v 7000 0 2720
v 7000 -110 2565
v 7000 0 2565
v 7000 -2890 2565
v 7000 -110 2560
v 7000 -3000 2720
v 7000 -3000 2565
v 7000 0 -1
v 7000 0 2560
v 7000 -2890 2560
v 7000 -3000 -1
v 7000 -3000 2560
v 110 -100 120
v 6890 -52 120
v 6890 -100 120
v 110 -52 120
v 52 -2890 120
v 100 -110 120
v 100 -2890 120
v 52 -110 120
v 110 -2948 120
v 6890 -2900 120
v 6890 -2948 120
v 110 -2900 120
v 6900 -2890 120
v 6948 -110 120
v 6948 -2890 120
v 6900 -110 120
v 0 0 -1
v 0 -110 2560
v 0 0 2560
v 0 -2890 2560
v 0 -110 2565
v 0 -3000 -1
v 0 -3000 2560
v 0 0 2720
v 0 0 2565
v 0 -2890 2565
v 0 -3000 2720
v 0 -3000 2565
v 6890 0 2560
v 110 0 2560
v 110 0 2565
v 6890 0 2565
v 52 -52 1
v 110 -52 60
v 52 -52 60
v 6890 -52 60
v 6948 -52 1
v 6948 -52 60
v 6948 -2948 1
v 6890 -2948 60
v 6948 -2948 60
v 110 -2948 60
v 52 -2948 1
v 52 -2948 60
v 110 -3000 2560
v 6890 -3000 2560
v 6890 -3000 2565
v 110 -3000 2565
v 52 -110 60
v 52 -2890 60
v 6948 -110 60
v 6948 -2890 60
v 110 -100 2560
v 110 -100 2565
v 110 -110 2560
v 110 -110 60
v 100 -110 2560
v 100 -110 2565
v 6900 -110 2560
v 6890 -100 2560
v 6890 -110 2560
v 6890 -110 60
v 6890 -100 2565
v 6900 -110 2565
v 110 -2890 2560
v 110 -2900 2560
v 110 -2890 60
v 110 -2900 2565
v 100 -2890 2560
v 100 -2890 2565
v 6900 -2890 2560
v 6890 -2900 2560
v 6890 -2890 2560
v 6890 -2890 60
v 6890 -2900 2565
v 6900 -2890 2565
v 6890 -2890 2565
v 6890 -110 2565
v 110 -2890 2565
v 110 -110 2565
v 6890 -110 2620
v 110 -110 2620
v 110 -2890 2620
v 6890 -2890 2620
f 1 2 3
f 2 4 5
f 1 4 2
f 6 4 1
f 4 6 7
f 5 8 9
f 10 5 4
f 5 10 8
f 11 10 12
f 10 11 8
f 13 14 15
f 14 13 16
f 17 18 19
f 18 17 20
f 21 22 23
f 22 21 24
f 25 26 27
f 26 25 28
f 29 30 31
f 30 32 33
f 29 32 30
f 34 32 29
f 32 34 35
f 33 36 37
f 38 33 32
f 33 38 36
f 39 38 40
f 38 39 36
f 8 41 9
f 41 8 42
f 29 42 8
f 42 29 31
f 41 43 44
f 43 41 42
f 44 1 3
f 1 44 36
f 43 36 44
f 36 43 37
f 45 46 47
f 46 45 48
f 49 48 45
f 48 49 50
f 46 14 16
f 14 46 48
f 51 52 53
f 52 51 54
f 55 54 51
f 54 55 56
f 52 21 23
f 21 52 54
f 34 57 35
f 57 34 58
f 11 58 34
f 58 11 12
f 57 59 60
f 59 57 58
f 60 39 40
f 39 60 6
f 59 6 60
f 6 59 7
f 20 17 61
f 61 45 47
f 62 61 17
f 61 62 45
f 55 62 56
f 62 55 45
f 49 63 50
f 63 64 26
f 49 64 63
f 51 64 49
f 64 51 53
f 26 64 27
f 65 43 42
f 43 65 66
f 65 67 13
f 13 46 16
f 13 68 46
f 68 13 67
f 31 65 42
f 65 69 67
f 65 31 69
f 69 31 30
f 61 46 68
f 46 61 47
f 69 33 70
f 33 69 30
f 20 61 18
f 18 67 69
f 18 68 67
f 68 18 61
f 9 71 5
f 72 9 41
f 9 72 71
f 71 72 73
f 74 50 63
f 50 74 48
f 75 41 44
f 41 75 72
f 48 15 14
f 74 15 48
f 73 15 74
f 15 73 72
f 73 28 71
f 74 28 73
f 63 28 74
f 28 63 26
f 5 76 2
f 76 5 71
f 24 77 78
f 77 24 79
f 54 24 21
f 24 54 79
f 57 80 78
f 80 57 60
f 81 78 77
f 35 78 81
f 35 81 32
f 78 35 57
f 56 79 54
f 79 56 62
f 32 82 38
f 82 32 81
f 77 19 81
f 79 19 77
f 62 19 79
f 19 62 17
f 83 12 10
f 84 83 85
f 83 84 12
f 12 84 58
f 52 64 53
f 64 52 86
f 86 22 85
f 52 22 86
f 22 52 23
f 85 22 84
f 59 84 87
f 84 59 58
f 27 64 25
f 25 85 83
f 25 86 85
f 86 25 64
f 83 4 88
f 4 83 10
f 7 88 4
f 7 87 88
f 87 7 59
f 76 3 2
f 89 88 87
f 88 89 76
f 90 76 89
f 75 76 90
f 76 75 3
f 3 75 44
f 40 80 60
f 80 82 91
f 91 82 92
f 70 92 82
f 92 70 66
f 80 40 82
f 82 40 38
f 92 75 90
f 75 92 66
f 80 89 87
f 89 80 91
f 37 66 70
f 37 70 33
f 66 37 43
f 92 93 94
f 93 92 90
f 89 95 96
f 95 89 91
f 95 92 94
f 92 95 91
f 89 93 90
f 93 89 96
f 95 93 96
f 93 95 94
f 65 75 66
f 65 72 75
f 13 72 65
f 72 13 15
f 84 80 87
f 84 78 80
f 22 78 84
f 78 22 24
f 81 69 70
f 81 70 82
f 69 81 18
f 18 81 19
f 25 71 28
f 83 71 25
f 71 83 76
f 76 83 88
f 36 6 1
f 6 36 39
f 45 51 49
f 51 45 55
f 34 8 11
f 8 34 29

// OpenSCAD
// ============================================================================
// CONTAINER DESIGN MODULE - IMPROVED VERSION
// ============================================================================
// Description: Parametric container design system with steel profiles
// Author: Improved version
// Date: 2025-10-26
// ============================================================================

// ============================================================================
// CONFIGURATION PARAMETERS
// ============================================================================

/* [Main Container Dimensions] */
container_length = 7000;  // [3000:100:9020] Length of container (mm)
container_width = 3000;   // [2000:100:3000] Width of container (mm)
container_height = 2500;  // [1800:10:3000] Height of container (mm)

/* [Container Specification] */
container_type = "ПБК";              // ["ПБК", "УБК"] Container type
sandwich_thickness = 100;             // [50:10:150] Sandwich panel thickness (mm)
temperature_mode = -60;               // [-60:10:40] Minimum temperature (°C)

/* [Base Frame Parameters] */
sheet_width = 1250;                   // Width of sheet metal in base frame
main_beam_type = "12П";               // ["10П", "12П", "14П", "16П"] Main transverse beam type
long_beam_material = "Труба";         // ["Труба", "Швеллер"] Longitudinal beam material
long_beam_step = 1200;                // [400:100:2000] Longitudinal beam spacing (mm)

/* [Additional Elements] */
show_drainage = true;                 // Show drainage trough
show_corner_brackets = true;          // Show corner brackets
corner_bracket_size = 140;            // [100:10:200] Corner bracket size (mm)

/* [Door Parameters] */
door_height = 2000;                   // [1800:100:2400] Door height (mm)
door_width = 1007;                    // [800:100:1200] Door width (mm)

/* [Cable Entry Parameters] */
cable_entry_height = 300;             // [200:50:500] Cable entry height (mm)
cable_entry_offset = 500;             // [300:100:1000] Cable entry offset (mm)
cable_entry_count = 5;                // [1:1:10] Number of cable entries
cable_entry_profile = "50x50x3";      // Profile type for cable entry

/* [Filling Neck Parameters] */
filling_neck_height = 1500;           // [1000:100:2000] Filling neck height (mm)
filling_neck_offset = 500;            // [300:100:1000] Filling neck offset (mm)

/* [Roof Parameters] */
roof_rafter_profile = "40x20x2";      // Rafter profile type
roof_ridge_height = 100;              // [0:50:200] Roof ridge height (mm)

/* [Ventilation Grilles] */
grille_anr1_height = 1000;            // [500:100:1500] ANR1 grille height (mm)
grille_anr1_width = 1000;             // [500:100:1500] ANR1 grille width (mm)
grille_anr2_height = 1000;            // [500:100:1500] ANR2 grille height (mm)
grille_anr2_width = 1000;             // [500:100:1500] ANR2 grille width (mm)

/* [Visualization] */
transparency = 0.5;                   // [0:0.1:1] Component transparency
element_config = 1;                   // [1:1:10] Element arrangement configuration

/* [System Parameters] */
$fn = 50;                             // Circle resolution
visual_scale = 1.0;                   // [0.5:0.1:2.0] Visual scale factor
standard_panel_width = 1195;          // Standard sandwich panel width (mm)

// ============================================================================
// MATERIAL DATABASE - STEEL PROFILES
// ============================================================================
// Format: [Name, Standard, Size, Subtype, h, b, s, t, r, R, A, Mass]

function create_profile_database() = [
    // Channels (Швеллер)
    ["Швеллер", "ГОСТ 8240-97", "12Л", "легкой серии с параллельными гранями полок", 120, 30, 3, 4.8, 7.6, 7, 6.39, 5.02],
    ["Швеллер", "ГОСТ 8240-97", "16Л", "легкой серии с параллельными гранями полок", 160, 35, 3.4, 5.3, 8.3, 8, 9.04, 7.1],
    ["Швеллер", "ГОСТ 8240-89", "10П", "с параллельными гранями полок", 100, 46, 4.5, 7.6, 15.3, 7, 10.9, 8.59],
    ["Швеллер", "ГОСТ 8240-89", "12П", "с параллельными гранями полок", 120, 52, 4.8, 7.8, 16.6, 7.5, 13.3, 10.4],
    ["Швеллер", "ГОСТ 8240-89", "14П", "с параллельными гранями полок", 140, 58, 4.9, 8.1, 18.2, 8, 15.6, 12.3],
    ["Швеллер", "ГОСТ 8240-89", "16П", "с параллельными гранями полок", 160, 64, 5, 8.4, 19.7, 8.5, 18.1, 14.2],

    // Square Tubes (Труба квадратная)
    ["Труба", "ГОСТ Р 54157-2010", "40x40x3", "квадратная", 40, 40, 3, 6, 4.21, 3.3, 9.32, 4.66],
    ["Труба", "ГОСТ Р 54157-2010", "50x50x3", "квадратная", 50, 50, 3, 6, 5.41, 4.25, 19.47, 7.79],
    ["Труба", "ГОСТ 30245-2003", "80x80x6", "квадратная", 80, 80, 6, 12, 9.38, 7.36, 56.97, 9.8],
    ["Труба", "ГОСТ 30245-2003", "100x100x5", "квадратная", 100, 100, 5, 10, 18.36, 14.41, 270.9, 54.19],
    ["Труба", "ГОСТ 30245-2003", "120x120x5", "квадратная", 120, 120, 6, 12, 26.43, 20.75, 561.8, 93.64],
    ["Труба", "ГОСТ 30245-2003", "140x140x7", "квадратная", 140, 140, 7, 17.5, 35.56, 27.91, 1020, 145.7],
    ["Труба", "ГОСТ 30245-2003", "160x160x6", "квадратная", 160, 160, 6, 12, 36.03, 28.29, 1405, 175.6],

    // Rectangular Tubes (Труба прямоугольная)
    ["Труба", "ГОСТ Р 54157-2010", "40x20x2", "прямоугольная", 40, 20, 2, 3, 2.17, 1.704, 4.18, 2.09],
    ["Труба", "ГОСТ 30245-2003", "80x40x3", "прямоугольная", 80, 40, 3, 6, 6.61, 5.19, 52.24, 13.06],
    ["Труба", "ГОСТ Р 54157-2010", "80x40x3", "прямоугольная", 80, 40, 3, 6, 6.61, 5.195, 52.25, 13.06],
    ["Труба", "ГОСТ 30245-2003", "150x100x5", "прямоугольная", 150, 100, 5, 10, 23.36, 18.33, 719, 95.87],
    ["Труба", "ГОСТ Р 54157-2010", "150x100x5", "прямоугольная", 150, 100, 5, 10, 23.36, 18.33, 719.2, 95.89],

    // Angles (Уголок)
    ["Уголок", "ГОСТ 8509-93", "50x50x5", "равнополочный", 50, 50, 5, 5.5, 4.8, 3.77, 11.2, 3.13],
    ["Уголок", "ГОСТ 8509-93", "63x63x6", "равнополочный", 63, 63, 6, 7, 7.28, 5.72, 27.06, 5.98],
    ["Уголок", "ГОСТ 8509-93", "80x80x6", "равнополочный", 80, 80, 6, 9, 9.38, 7.36, 56.97, 9.8],
    ["Уголок", "ГОСТ 8509-93", "90x90x6", "равнополочный", 90, 90, 6, 10, 10.61, 8.33, 82.1, 12.49],
    ["Уголок", "ГОСТ 8509-93", "110x110x7", "равнополочный", 110, 110, 7, 12, 15.15, 11.89, 175.61, 21.83],

    // Strips (Полоса)
    ["Полоса", "ГОСТ 103-76", "4x40", "горячекатанная", 40, 4, undef, undef, undef, undef, undef, undef]
];

// ============================================================================
// HELPER FUNCTIONS - DATABASE ACCESS
// ============================================================================

// Get parameter from profile database
function get_profile_param(material, size, param, database = undef) =
    let(
        db = database == undef ? create_profile_database() : database,
        matched = [for (profile = db)
            if (profile[0] == material && profile[2] == size) profile
        ]
    )
    len(matched) > 0 ?
        let(profile = matched[0])
        param == "name" ? profile[0] :
        param == "standard" ? profile[1] :
        param == "size" ? profile[2] :
        param == "subtype" ? profile[3] :
        param == "h" ? profile[4] :
        param == "b" ? profile[5] :
        param == "s" ? profile[6] :
        param == "t" ? profile[7] :
        param == "r" ? profile[8] :
        param == "R" ? profile[9] :
        param == "A" ? profile[10] :
        param == "mass" ? profile[11] :
        undef
    : undef;

// Get beam type and size based on component, container type, and sandwich thickness
function get_beam_spec(component_name, container_type, sandwich_thick) =
    let(
        specs = [
            // Upper frame longitudinal beams
            ["Балка продольная левая верхней рамы", "ПБК", 50, "Уголок", "63x63x6"],
            ["Балка продольная левая верхней рамы", "ПБК", 80, "Уголок", "90x90x6"],
            ["Балка продольная левая верхней рамы", "ПБК", 100, "Уголок", "110x110x7"],
            ["Балка продольная левая верхней рамы", "УБК", 50, "Труба", "80x40x3"],
            ["Балка продольная левая верхней рамы", "УБК", 80, "Труба", "80x40x3"],
            ["Балка продольная левая верхней рамы", "УБК", 100, "Труба", "80x40x3"],

            ["Балка продольная правая верхней рамы", "ПБК", 50, "Уголок", "63x63x6"],
            ["Балка продольная правая верхней рамы", "ПБК", 80, "Уголок", "90x90x6"],
            ["Балка продольная правая верхней рамы", "ПБК", 100, "Уголок", "110x110x7"],
            ["Балка продольная правая верхней рамы", "УБК", 50, "Труба", "80x40x3"],
            ["Балка продольная правая верхней рамы", "УБК", 80, "Труба", "80x40x3"],
            ["Балка продольная правая верхней рамы", "УБК", 100, "Труба", "80x40x3"],

            // Upper frame transverse beams
            ["Балка поперечная передняя верхней рамы", "ПБК", 50, "Уголок", "63x63x6"],
            ["Балка поперечная передняя верхней рамы", "ПБК", 80, "Уголок", "90x90x6"],
            ["Балка поперечная передняя верхней рамы", "ПБК", 100, "Уголок", "110x110x7"],
            ["Балка поперечная передняя верхней рамы", "УБК", 50, "Труба", "80x40x3"],
            ["Балка поперечная передняя верхней рамы", "УБК", 80, "Труба", "80x40x3"],
            ["Балка поперечная передняя верхней рамы", "УБК", 100, "Труба", "80x40x3"],

            ["Балка поперечная задняя верхней рамы", "ПБК", 50, "Уголок", "63x63x6"],
            ["Балка поперечная задняя верхней рамы", "ПБК", 80, "Уголок", "90x90x6"],
            ["Балка поперечная задняя верхней рамы", "ПБК", 100, "Уголок", "110x110x7"],
            ["Балка поперечная задняя верхней рамы", "УБК", 50, "Труба", "80x40x3"],
            ["Балка поперечная задняя верхней рамы", "УБК", 80, "Труба", "80x40x3"],
            ["Балка поперечная задняя верхней рамы", "УБК", 100, "Труба", "80x40x3"],

            // Corner posts
            ["Стойка угловая передняя левая", "ПБК", 50, "Уголок", "63x63x6"],
            ["Стойка угловая передняя левая", "ПБК", 80, "Уголок", "90x90x6"],
            ["Стойка угловая передняя левая", "ПБК", 100, "Уголок", "110x110x7"],
            ["Стойка угловая передняя левая", "УБК", 50, "Труба", "150x100x5"],
            ["Стойка угловая передняя левая", "УБК", 80, "Труба", "150x100x5"],
            ["Стойка угловая передняя левая", "УБК", 100, "Труба", "150x100x5"],

            ["Стойка угловая передняя правая", "ПБК", 50, "Уголок", "63x63x6"],
            ["Стойка угловая передняя правая", "ПБК", 80, "Уголок", "90x90x6"],
            ["Стойка угловая передняя правая", "ПБК", 100, "Уголок", "110x110x7"],
            ["Стойка угловая передняя правая", "УБК", 50, "Труба", "150x100x5"],
            ["Стойка угловая передняя правая", "УБК", 80, "Труба", "150x100x5"],
            ["Стойка угловая передняя правая", "УБК", 100, "Труба", "150x100x5"],

            ["Стойка угловая задняя левая", "ПБК", 50, "Уголок", "63x63x6"],
            ["Стойка угловая задняя левая", "ПБК", 80, "Уголок", "90x90x6"],
            ["Стойка угловая задняя левая", "ПБК", 100, "Уголок", "110x110x7"],
            ["Стойка угловая задняя левая", "УБК", 50, "Труба", "150x100x5"],
            ["Стойка угловая задняя левая", "УБК", 80, "Труба", "150x100x5"],
            ["Стойка угловая задняя левая", "УБК", 100, "Труба", "150x100x5"],

            ["Стойка угловая задняя правая", "ПБК", 50, "Уголок", "63x63x6"],
            ["Стойка угловая задняя правая", "ПБК", 80, "Уголок", "90x90x6"],
            ["Стойка угловая задняя правая", "ПБК", 100, "Уголок", "110x110x7"],
            ["Стойка угловая задняя правая", "УБК", 50, "Труба", "150x100x5"],
            ["Стойка угловая задняя правая", "УБК", 80, "Труба", "150x100x5"],
            ["Стойка угловая задняя правая", "УБК", 100, "Труба", "150x100x5"],

            // Intermediate posts
            ["Стойка промежуточная левая", "ПБК", 50, "Уголок", "50x50x5"],
            ["Стойка промежуточная левая", "ПБК", 80, "Уголок", "80x80x6"],
            ["Стойка промежуточная левая", "ПБК", 100, "Уголок", "90x90x6"],
            ["Стойка промежуточная левая", "УБК", 50, "Труба", "40x40x3"],
            ["Стойка промежуточная левая", "УБК", 80, "Труба", "40x40x3"],
            ["Стойка промежуточная левая", "УБК", 100, "Труба", "40x40x3"],

            ["Стойка промежуточная правая", "ПБК", 50, "Уголок", "50x50x5"],
            ["Стойка промежуточная правая", "ПБК", 80, "Уголок", "80x80x6"],
            ["Стойка промежуточная правая", "ПБК", 100, "Уголок", "90x90x6"],
            ["Стойка промежуточная правая", "УБК", 50, "Труба", "40x40x3"],
            ["Стойка промежуточная правая", "УБК", 80, "Труба", "40x40x3"],
            ["Стойка промежуточная правая", "УБК", 100, "Труба", "40x40x3"],

            // Additional beams
            ["Дополнительные балки для каркаса навесных элементов стен", "ПБК", 50, "Уголок", "50x50x5"],
            ["Дополнительные балки для каркаса навесных элементов стен", "ПБК", 80, "Уголок", "50x50x5"],
            ["Дополнительные балки для каркаса навесных элементов стен", "ПБК", 100, "Уголок", "50x50x5"],
            ["Дополнительные балки для каркаса навесных элементов стен", "УБК", 50, "Труба", "40x40x3"],
            ["Дополнительные балки для каркаса навесных элементов стен", "УБК", 80, "Труба", "40x40x3"],
            ["Дополнительные балки для каркаса навесных элементов стен", "УБК", 100, "Труба", "40x40x3"]
        ],
        matched = [for (spec = specs)
            if (spec[0] == component_name && spec[1] == container_type && spec[2] == sandwich_thick)
            [spec[3], spec[4]]
        ]
    )
    len(matched) > 0 ? matched[0] : ["Unknown", "Unknown"];

// Generate coordinate array with specified step
function generate_coords(length, step, min_offset = 200, max_offset = 200) =
    let(
        start = (length - ceil(length / step) * step),
        coords = [for (i = [0 : ceil(length / step)]) start + i * step]
    )
    [for (c = coords) if (c >= min_offset && c <= length - max_offset) c];

// Generate coordinates for intermediate posts
function generate_post_coords(length) =
    length < 4000 ? [] :
    length <= 6000 ? [length / 2] :
    [for (i = [1 : floor((length - 500) / 2500)]) i * 2500];

// Select steel type based on temperature
function select_steel_type(temperature) =
    temperature < -45 ? "09Г2С (ниже -45°С)" : "Сталь 3 (до -45°С)";

// Get profile color based on type
function get_profile_color(profile_type) =
    profile_type == "Швеллер" ? [0.25, 0.25, 0.25] :
    profile_type == "Уголок" ? [0.35, 0.35, 0.35] :
    profile_type == "Труба" ? [0.65, 0.65, 0.65] :
    profile_type == "Полоса" ? [0.85, 0.85, 0.85] :
    [0.50, 0.50, 0.50];

// ============================================================================
// GEOMETRIC PRIMITIVES
// ============================================================================

// Create a simple box wall element
module wall_element(width, height, length, position = [0, 0, 0], offset = 1) {
    translate(position) {
        cube([width, height, length - offset], center = true);
    }
}

// Create a profile detail
module profile_detail(
    material,
    size,
    length,
    position = [0, 0, 0],
    rotation = [0, 0, 0],
    locks = [0, 0, 0, 0, 0, 0, 0, 0],
    assembly = "Assembly",
    component = "Component"
) {
    h = get_profile_param(material, size, "h");
    b = get_profile_param(material, size, "b");
    s = get_profile_param(material, size, "s");
    t = get_profile_param(material, size, "t");

    color(get_profile_color(material)) {
        translate(position) {
            rotate(rotation) {
                // Simplified profile representation
                if (material == "Труба") {
                    // Hollow rectangular/square tube
                    difference() {
                        cube([h, b, length], center = true);
                        cube([h - 2*s, b - 2*s, length + 1], center = true);
                    }
                } else if (material == "Швеллер") {
                    // Channel profile (simplified)
                    cube([h, b, length], center = true);
                } else if (material == "Уголок") {
                    // Angle profile (simplified L-shape)
                    cube([h, b, length], center = true);
                } else if (material == "Полоса") {
                    // Flat strip
                    cube([h, b, length], center = true);
                }
            }
        }
    }
}

// ============================================================================
// MAIN CONTAINER MODULE (SIMPLIFIED VERSION)
// ============================================================================

module simplified_container() {
    // Get beam specifications
    db = create_profile_database();

    // Calculate main dimensions
    L = container_length;
    W = container_width;
    H = container_height;

    // Base frame channel size
    channel_h = get_profile_param("Швеллер", main_beam_type, "h", db);
    channel_b = get_profile_param("Швеллер", main_beam_type, "b", db);
    channel_s = get_profile_param("Швеллер", main_beam_type, "s", db);
    channel_t = get_profile_param("Швеллер", main_beam_type, "t", db);

    echo("Container dimensions:", L, W, H);
    echo("Base channel:", main_beam_type, "h=", channel_h, "b=", channel_b);
    echo("Steel type:", select_steel_type(temperature_mode));

    // Base frame
    color([0.3, 0.3, 0.3]) {
        // Longitudinal beams
        translate([L/2, -channel_b/2, channel_h/2])
            cube([L, channel_b, channel_h], center = true);
        translate([L/2, -W + channel_b/2, channel_h/2])
            cube([L, channel_b, channel_h], center = true);

        // Transverse beams
        translate([channel_b/2, -W/2, channel_h/2])
            cube([channel_b, W, channel_h], center = true);
        translate([L - channel_b/2, -W/2, channel_h/2])
            cube([channel_b, W, channel_h], center = true);
    }

    // Vertical corner posts
    post_spec = get_beam_spec("Стойка угловая передняя левая", container_type, sandwich_thickness);
    post_h = get_profile_param(post_spec[0], post_spec[1], "h", db);

    if (post_h != undef) {
        color([0.4, 0.4, 0.4]) {
            // Four corner posts
            translate([post_h/2, -post_h/2, H/2 + channel_h/2])
                cube([post_h, post_h, H], center = true);
            translate([L - post_h/2, -post_h/2, H/2 + channel_h/2])
                cube([post_h, post_h, H], center = true);
            translate([post_h/2, -W + post_h/2, H/2 + channel_h/2])
                cube([post_h, post_h, H], center = true);
            translate([L - post_h/2, -W + post_h/2, H/2 + channel_h/2])
                cube([post_h, post_h, H], center = true);
        }
    }

    // Top frame
    color([0.35, 0.35, 0.35]) {
        translate([L/2, -post_h/2, H + channel_h])
            cube([L, post_h, post_h], center = true);
        translate([L/2, -W + post_h/2, H + channel_h])
            cube([L, post_h, post_h], center = true);
        translate([post_h/2, -W/2, H + channel_h])
            cube([post_h, W, post_h], center = true);
        translate([L - post_h/2, -W/2, H + channel_h])
            cube([post_h, W, post_h], center = true);
    }

    // Sandwich panels (simplified)
    if (sandwich_thickness > 0) {
        color([0.9, 0.95, 1.0], transparency) {
            // Front wall
            translate([L/2, -sandwich_thickness/2, H/2 + channel_h])
                cube([L - 2*post_h, sandwich_thickness, H], center = true);

            // Back wall
            translate([L/2, -W + sandwich_thickness/2, H/2 + channel_h])
                cube([L - 2*post_h, sandwich_thickness, H], center = true);

            // Left wall
            translate([sandwich_thickness/2, -W/2, H/2 + channel_h])
                cube([sandwich_thickness, W - 2*post_h, H], center = true);

            // Right wall
            translate([L - sandwich_thickness/2, -W/2, H/2 + channel_h])
                cube([sandwich_thickness, W - 2*post_h, H], center = true);

            // Roof
            translate([L/2, -W/2, H + channel_h + sandwich_thickness/2])
                cube([L, W, sandwich_thickness], center = true);
        }
    }

    // Floor decking
    color([0.6, 0.6, 0.6], transparency) {
        translate([L/2, -W/2, 0])
            cube([L, W, 2], center = true);
    }
}

// ============================================================================
// EXECUTE
// ============================================================================

simplified_container();

// ============================================================================
// USAGE NOTES:
// ============================================================================
// This improved version includes:
// 1. Proper English comments and documentation
// 2. Organized parameter sections with clear names
// 3. Centralized database functions
// 4. Helper functions for common calculations
// 5. Modular structure for easy maintenance
// 6. Simplified visualization for performance
//
// To use the full detailed version, you would need to:
// - Add the detailed profile rendering modules
// - Include STL file paths as parameters
// - Implement door, cable entry, and other detailed components
// - Add roof truss system
// - Implement full drainage system
// ============================================================================
